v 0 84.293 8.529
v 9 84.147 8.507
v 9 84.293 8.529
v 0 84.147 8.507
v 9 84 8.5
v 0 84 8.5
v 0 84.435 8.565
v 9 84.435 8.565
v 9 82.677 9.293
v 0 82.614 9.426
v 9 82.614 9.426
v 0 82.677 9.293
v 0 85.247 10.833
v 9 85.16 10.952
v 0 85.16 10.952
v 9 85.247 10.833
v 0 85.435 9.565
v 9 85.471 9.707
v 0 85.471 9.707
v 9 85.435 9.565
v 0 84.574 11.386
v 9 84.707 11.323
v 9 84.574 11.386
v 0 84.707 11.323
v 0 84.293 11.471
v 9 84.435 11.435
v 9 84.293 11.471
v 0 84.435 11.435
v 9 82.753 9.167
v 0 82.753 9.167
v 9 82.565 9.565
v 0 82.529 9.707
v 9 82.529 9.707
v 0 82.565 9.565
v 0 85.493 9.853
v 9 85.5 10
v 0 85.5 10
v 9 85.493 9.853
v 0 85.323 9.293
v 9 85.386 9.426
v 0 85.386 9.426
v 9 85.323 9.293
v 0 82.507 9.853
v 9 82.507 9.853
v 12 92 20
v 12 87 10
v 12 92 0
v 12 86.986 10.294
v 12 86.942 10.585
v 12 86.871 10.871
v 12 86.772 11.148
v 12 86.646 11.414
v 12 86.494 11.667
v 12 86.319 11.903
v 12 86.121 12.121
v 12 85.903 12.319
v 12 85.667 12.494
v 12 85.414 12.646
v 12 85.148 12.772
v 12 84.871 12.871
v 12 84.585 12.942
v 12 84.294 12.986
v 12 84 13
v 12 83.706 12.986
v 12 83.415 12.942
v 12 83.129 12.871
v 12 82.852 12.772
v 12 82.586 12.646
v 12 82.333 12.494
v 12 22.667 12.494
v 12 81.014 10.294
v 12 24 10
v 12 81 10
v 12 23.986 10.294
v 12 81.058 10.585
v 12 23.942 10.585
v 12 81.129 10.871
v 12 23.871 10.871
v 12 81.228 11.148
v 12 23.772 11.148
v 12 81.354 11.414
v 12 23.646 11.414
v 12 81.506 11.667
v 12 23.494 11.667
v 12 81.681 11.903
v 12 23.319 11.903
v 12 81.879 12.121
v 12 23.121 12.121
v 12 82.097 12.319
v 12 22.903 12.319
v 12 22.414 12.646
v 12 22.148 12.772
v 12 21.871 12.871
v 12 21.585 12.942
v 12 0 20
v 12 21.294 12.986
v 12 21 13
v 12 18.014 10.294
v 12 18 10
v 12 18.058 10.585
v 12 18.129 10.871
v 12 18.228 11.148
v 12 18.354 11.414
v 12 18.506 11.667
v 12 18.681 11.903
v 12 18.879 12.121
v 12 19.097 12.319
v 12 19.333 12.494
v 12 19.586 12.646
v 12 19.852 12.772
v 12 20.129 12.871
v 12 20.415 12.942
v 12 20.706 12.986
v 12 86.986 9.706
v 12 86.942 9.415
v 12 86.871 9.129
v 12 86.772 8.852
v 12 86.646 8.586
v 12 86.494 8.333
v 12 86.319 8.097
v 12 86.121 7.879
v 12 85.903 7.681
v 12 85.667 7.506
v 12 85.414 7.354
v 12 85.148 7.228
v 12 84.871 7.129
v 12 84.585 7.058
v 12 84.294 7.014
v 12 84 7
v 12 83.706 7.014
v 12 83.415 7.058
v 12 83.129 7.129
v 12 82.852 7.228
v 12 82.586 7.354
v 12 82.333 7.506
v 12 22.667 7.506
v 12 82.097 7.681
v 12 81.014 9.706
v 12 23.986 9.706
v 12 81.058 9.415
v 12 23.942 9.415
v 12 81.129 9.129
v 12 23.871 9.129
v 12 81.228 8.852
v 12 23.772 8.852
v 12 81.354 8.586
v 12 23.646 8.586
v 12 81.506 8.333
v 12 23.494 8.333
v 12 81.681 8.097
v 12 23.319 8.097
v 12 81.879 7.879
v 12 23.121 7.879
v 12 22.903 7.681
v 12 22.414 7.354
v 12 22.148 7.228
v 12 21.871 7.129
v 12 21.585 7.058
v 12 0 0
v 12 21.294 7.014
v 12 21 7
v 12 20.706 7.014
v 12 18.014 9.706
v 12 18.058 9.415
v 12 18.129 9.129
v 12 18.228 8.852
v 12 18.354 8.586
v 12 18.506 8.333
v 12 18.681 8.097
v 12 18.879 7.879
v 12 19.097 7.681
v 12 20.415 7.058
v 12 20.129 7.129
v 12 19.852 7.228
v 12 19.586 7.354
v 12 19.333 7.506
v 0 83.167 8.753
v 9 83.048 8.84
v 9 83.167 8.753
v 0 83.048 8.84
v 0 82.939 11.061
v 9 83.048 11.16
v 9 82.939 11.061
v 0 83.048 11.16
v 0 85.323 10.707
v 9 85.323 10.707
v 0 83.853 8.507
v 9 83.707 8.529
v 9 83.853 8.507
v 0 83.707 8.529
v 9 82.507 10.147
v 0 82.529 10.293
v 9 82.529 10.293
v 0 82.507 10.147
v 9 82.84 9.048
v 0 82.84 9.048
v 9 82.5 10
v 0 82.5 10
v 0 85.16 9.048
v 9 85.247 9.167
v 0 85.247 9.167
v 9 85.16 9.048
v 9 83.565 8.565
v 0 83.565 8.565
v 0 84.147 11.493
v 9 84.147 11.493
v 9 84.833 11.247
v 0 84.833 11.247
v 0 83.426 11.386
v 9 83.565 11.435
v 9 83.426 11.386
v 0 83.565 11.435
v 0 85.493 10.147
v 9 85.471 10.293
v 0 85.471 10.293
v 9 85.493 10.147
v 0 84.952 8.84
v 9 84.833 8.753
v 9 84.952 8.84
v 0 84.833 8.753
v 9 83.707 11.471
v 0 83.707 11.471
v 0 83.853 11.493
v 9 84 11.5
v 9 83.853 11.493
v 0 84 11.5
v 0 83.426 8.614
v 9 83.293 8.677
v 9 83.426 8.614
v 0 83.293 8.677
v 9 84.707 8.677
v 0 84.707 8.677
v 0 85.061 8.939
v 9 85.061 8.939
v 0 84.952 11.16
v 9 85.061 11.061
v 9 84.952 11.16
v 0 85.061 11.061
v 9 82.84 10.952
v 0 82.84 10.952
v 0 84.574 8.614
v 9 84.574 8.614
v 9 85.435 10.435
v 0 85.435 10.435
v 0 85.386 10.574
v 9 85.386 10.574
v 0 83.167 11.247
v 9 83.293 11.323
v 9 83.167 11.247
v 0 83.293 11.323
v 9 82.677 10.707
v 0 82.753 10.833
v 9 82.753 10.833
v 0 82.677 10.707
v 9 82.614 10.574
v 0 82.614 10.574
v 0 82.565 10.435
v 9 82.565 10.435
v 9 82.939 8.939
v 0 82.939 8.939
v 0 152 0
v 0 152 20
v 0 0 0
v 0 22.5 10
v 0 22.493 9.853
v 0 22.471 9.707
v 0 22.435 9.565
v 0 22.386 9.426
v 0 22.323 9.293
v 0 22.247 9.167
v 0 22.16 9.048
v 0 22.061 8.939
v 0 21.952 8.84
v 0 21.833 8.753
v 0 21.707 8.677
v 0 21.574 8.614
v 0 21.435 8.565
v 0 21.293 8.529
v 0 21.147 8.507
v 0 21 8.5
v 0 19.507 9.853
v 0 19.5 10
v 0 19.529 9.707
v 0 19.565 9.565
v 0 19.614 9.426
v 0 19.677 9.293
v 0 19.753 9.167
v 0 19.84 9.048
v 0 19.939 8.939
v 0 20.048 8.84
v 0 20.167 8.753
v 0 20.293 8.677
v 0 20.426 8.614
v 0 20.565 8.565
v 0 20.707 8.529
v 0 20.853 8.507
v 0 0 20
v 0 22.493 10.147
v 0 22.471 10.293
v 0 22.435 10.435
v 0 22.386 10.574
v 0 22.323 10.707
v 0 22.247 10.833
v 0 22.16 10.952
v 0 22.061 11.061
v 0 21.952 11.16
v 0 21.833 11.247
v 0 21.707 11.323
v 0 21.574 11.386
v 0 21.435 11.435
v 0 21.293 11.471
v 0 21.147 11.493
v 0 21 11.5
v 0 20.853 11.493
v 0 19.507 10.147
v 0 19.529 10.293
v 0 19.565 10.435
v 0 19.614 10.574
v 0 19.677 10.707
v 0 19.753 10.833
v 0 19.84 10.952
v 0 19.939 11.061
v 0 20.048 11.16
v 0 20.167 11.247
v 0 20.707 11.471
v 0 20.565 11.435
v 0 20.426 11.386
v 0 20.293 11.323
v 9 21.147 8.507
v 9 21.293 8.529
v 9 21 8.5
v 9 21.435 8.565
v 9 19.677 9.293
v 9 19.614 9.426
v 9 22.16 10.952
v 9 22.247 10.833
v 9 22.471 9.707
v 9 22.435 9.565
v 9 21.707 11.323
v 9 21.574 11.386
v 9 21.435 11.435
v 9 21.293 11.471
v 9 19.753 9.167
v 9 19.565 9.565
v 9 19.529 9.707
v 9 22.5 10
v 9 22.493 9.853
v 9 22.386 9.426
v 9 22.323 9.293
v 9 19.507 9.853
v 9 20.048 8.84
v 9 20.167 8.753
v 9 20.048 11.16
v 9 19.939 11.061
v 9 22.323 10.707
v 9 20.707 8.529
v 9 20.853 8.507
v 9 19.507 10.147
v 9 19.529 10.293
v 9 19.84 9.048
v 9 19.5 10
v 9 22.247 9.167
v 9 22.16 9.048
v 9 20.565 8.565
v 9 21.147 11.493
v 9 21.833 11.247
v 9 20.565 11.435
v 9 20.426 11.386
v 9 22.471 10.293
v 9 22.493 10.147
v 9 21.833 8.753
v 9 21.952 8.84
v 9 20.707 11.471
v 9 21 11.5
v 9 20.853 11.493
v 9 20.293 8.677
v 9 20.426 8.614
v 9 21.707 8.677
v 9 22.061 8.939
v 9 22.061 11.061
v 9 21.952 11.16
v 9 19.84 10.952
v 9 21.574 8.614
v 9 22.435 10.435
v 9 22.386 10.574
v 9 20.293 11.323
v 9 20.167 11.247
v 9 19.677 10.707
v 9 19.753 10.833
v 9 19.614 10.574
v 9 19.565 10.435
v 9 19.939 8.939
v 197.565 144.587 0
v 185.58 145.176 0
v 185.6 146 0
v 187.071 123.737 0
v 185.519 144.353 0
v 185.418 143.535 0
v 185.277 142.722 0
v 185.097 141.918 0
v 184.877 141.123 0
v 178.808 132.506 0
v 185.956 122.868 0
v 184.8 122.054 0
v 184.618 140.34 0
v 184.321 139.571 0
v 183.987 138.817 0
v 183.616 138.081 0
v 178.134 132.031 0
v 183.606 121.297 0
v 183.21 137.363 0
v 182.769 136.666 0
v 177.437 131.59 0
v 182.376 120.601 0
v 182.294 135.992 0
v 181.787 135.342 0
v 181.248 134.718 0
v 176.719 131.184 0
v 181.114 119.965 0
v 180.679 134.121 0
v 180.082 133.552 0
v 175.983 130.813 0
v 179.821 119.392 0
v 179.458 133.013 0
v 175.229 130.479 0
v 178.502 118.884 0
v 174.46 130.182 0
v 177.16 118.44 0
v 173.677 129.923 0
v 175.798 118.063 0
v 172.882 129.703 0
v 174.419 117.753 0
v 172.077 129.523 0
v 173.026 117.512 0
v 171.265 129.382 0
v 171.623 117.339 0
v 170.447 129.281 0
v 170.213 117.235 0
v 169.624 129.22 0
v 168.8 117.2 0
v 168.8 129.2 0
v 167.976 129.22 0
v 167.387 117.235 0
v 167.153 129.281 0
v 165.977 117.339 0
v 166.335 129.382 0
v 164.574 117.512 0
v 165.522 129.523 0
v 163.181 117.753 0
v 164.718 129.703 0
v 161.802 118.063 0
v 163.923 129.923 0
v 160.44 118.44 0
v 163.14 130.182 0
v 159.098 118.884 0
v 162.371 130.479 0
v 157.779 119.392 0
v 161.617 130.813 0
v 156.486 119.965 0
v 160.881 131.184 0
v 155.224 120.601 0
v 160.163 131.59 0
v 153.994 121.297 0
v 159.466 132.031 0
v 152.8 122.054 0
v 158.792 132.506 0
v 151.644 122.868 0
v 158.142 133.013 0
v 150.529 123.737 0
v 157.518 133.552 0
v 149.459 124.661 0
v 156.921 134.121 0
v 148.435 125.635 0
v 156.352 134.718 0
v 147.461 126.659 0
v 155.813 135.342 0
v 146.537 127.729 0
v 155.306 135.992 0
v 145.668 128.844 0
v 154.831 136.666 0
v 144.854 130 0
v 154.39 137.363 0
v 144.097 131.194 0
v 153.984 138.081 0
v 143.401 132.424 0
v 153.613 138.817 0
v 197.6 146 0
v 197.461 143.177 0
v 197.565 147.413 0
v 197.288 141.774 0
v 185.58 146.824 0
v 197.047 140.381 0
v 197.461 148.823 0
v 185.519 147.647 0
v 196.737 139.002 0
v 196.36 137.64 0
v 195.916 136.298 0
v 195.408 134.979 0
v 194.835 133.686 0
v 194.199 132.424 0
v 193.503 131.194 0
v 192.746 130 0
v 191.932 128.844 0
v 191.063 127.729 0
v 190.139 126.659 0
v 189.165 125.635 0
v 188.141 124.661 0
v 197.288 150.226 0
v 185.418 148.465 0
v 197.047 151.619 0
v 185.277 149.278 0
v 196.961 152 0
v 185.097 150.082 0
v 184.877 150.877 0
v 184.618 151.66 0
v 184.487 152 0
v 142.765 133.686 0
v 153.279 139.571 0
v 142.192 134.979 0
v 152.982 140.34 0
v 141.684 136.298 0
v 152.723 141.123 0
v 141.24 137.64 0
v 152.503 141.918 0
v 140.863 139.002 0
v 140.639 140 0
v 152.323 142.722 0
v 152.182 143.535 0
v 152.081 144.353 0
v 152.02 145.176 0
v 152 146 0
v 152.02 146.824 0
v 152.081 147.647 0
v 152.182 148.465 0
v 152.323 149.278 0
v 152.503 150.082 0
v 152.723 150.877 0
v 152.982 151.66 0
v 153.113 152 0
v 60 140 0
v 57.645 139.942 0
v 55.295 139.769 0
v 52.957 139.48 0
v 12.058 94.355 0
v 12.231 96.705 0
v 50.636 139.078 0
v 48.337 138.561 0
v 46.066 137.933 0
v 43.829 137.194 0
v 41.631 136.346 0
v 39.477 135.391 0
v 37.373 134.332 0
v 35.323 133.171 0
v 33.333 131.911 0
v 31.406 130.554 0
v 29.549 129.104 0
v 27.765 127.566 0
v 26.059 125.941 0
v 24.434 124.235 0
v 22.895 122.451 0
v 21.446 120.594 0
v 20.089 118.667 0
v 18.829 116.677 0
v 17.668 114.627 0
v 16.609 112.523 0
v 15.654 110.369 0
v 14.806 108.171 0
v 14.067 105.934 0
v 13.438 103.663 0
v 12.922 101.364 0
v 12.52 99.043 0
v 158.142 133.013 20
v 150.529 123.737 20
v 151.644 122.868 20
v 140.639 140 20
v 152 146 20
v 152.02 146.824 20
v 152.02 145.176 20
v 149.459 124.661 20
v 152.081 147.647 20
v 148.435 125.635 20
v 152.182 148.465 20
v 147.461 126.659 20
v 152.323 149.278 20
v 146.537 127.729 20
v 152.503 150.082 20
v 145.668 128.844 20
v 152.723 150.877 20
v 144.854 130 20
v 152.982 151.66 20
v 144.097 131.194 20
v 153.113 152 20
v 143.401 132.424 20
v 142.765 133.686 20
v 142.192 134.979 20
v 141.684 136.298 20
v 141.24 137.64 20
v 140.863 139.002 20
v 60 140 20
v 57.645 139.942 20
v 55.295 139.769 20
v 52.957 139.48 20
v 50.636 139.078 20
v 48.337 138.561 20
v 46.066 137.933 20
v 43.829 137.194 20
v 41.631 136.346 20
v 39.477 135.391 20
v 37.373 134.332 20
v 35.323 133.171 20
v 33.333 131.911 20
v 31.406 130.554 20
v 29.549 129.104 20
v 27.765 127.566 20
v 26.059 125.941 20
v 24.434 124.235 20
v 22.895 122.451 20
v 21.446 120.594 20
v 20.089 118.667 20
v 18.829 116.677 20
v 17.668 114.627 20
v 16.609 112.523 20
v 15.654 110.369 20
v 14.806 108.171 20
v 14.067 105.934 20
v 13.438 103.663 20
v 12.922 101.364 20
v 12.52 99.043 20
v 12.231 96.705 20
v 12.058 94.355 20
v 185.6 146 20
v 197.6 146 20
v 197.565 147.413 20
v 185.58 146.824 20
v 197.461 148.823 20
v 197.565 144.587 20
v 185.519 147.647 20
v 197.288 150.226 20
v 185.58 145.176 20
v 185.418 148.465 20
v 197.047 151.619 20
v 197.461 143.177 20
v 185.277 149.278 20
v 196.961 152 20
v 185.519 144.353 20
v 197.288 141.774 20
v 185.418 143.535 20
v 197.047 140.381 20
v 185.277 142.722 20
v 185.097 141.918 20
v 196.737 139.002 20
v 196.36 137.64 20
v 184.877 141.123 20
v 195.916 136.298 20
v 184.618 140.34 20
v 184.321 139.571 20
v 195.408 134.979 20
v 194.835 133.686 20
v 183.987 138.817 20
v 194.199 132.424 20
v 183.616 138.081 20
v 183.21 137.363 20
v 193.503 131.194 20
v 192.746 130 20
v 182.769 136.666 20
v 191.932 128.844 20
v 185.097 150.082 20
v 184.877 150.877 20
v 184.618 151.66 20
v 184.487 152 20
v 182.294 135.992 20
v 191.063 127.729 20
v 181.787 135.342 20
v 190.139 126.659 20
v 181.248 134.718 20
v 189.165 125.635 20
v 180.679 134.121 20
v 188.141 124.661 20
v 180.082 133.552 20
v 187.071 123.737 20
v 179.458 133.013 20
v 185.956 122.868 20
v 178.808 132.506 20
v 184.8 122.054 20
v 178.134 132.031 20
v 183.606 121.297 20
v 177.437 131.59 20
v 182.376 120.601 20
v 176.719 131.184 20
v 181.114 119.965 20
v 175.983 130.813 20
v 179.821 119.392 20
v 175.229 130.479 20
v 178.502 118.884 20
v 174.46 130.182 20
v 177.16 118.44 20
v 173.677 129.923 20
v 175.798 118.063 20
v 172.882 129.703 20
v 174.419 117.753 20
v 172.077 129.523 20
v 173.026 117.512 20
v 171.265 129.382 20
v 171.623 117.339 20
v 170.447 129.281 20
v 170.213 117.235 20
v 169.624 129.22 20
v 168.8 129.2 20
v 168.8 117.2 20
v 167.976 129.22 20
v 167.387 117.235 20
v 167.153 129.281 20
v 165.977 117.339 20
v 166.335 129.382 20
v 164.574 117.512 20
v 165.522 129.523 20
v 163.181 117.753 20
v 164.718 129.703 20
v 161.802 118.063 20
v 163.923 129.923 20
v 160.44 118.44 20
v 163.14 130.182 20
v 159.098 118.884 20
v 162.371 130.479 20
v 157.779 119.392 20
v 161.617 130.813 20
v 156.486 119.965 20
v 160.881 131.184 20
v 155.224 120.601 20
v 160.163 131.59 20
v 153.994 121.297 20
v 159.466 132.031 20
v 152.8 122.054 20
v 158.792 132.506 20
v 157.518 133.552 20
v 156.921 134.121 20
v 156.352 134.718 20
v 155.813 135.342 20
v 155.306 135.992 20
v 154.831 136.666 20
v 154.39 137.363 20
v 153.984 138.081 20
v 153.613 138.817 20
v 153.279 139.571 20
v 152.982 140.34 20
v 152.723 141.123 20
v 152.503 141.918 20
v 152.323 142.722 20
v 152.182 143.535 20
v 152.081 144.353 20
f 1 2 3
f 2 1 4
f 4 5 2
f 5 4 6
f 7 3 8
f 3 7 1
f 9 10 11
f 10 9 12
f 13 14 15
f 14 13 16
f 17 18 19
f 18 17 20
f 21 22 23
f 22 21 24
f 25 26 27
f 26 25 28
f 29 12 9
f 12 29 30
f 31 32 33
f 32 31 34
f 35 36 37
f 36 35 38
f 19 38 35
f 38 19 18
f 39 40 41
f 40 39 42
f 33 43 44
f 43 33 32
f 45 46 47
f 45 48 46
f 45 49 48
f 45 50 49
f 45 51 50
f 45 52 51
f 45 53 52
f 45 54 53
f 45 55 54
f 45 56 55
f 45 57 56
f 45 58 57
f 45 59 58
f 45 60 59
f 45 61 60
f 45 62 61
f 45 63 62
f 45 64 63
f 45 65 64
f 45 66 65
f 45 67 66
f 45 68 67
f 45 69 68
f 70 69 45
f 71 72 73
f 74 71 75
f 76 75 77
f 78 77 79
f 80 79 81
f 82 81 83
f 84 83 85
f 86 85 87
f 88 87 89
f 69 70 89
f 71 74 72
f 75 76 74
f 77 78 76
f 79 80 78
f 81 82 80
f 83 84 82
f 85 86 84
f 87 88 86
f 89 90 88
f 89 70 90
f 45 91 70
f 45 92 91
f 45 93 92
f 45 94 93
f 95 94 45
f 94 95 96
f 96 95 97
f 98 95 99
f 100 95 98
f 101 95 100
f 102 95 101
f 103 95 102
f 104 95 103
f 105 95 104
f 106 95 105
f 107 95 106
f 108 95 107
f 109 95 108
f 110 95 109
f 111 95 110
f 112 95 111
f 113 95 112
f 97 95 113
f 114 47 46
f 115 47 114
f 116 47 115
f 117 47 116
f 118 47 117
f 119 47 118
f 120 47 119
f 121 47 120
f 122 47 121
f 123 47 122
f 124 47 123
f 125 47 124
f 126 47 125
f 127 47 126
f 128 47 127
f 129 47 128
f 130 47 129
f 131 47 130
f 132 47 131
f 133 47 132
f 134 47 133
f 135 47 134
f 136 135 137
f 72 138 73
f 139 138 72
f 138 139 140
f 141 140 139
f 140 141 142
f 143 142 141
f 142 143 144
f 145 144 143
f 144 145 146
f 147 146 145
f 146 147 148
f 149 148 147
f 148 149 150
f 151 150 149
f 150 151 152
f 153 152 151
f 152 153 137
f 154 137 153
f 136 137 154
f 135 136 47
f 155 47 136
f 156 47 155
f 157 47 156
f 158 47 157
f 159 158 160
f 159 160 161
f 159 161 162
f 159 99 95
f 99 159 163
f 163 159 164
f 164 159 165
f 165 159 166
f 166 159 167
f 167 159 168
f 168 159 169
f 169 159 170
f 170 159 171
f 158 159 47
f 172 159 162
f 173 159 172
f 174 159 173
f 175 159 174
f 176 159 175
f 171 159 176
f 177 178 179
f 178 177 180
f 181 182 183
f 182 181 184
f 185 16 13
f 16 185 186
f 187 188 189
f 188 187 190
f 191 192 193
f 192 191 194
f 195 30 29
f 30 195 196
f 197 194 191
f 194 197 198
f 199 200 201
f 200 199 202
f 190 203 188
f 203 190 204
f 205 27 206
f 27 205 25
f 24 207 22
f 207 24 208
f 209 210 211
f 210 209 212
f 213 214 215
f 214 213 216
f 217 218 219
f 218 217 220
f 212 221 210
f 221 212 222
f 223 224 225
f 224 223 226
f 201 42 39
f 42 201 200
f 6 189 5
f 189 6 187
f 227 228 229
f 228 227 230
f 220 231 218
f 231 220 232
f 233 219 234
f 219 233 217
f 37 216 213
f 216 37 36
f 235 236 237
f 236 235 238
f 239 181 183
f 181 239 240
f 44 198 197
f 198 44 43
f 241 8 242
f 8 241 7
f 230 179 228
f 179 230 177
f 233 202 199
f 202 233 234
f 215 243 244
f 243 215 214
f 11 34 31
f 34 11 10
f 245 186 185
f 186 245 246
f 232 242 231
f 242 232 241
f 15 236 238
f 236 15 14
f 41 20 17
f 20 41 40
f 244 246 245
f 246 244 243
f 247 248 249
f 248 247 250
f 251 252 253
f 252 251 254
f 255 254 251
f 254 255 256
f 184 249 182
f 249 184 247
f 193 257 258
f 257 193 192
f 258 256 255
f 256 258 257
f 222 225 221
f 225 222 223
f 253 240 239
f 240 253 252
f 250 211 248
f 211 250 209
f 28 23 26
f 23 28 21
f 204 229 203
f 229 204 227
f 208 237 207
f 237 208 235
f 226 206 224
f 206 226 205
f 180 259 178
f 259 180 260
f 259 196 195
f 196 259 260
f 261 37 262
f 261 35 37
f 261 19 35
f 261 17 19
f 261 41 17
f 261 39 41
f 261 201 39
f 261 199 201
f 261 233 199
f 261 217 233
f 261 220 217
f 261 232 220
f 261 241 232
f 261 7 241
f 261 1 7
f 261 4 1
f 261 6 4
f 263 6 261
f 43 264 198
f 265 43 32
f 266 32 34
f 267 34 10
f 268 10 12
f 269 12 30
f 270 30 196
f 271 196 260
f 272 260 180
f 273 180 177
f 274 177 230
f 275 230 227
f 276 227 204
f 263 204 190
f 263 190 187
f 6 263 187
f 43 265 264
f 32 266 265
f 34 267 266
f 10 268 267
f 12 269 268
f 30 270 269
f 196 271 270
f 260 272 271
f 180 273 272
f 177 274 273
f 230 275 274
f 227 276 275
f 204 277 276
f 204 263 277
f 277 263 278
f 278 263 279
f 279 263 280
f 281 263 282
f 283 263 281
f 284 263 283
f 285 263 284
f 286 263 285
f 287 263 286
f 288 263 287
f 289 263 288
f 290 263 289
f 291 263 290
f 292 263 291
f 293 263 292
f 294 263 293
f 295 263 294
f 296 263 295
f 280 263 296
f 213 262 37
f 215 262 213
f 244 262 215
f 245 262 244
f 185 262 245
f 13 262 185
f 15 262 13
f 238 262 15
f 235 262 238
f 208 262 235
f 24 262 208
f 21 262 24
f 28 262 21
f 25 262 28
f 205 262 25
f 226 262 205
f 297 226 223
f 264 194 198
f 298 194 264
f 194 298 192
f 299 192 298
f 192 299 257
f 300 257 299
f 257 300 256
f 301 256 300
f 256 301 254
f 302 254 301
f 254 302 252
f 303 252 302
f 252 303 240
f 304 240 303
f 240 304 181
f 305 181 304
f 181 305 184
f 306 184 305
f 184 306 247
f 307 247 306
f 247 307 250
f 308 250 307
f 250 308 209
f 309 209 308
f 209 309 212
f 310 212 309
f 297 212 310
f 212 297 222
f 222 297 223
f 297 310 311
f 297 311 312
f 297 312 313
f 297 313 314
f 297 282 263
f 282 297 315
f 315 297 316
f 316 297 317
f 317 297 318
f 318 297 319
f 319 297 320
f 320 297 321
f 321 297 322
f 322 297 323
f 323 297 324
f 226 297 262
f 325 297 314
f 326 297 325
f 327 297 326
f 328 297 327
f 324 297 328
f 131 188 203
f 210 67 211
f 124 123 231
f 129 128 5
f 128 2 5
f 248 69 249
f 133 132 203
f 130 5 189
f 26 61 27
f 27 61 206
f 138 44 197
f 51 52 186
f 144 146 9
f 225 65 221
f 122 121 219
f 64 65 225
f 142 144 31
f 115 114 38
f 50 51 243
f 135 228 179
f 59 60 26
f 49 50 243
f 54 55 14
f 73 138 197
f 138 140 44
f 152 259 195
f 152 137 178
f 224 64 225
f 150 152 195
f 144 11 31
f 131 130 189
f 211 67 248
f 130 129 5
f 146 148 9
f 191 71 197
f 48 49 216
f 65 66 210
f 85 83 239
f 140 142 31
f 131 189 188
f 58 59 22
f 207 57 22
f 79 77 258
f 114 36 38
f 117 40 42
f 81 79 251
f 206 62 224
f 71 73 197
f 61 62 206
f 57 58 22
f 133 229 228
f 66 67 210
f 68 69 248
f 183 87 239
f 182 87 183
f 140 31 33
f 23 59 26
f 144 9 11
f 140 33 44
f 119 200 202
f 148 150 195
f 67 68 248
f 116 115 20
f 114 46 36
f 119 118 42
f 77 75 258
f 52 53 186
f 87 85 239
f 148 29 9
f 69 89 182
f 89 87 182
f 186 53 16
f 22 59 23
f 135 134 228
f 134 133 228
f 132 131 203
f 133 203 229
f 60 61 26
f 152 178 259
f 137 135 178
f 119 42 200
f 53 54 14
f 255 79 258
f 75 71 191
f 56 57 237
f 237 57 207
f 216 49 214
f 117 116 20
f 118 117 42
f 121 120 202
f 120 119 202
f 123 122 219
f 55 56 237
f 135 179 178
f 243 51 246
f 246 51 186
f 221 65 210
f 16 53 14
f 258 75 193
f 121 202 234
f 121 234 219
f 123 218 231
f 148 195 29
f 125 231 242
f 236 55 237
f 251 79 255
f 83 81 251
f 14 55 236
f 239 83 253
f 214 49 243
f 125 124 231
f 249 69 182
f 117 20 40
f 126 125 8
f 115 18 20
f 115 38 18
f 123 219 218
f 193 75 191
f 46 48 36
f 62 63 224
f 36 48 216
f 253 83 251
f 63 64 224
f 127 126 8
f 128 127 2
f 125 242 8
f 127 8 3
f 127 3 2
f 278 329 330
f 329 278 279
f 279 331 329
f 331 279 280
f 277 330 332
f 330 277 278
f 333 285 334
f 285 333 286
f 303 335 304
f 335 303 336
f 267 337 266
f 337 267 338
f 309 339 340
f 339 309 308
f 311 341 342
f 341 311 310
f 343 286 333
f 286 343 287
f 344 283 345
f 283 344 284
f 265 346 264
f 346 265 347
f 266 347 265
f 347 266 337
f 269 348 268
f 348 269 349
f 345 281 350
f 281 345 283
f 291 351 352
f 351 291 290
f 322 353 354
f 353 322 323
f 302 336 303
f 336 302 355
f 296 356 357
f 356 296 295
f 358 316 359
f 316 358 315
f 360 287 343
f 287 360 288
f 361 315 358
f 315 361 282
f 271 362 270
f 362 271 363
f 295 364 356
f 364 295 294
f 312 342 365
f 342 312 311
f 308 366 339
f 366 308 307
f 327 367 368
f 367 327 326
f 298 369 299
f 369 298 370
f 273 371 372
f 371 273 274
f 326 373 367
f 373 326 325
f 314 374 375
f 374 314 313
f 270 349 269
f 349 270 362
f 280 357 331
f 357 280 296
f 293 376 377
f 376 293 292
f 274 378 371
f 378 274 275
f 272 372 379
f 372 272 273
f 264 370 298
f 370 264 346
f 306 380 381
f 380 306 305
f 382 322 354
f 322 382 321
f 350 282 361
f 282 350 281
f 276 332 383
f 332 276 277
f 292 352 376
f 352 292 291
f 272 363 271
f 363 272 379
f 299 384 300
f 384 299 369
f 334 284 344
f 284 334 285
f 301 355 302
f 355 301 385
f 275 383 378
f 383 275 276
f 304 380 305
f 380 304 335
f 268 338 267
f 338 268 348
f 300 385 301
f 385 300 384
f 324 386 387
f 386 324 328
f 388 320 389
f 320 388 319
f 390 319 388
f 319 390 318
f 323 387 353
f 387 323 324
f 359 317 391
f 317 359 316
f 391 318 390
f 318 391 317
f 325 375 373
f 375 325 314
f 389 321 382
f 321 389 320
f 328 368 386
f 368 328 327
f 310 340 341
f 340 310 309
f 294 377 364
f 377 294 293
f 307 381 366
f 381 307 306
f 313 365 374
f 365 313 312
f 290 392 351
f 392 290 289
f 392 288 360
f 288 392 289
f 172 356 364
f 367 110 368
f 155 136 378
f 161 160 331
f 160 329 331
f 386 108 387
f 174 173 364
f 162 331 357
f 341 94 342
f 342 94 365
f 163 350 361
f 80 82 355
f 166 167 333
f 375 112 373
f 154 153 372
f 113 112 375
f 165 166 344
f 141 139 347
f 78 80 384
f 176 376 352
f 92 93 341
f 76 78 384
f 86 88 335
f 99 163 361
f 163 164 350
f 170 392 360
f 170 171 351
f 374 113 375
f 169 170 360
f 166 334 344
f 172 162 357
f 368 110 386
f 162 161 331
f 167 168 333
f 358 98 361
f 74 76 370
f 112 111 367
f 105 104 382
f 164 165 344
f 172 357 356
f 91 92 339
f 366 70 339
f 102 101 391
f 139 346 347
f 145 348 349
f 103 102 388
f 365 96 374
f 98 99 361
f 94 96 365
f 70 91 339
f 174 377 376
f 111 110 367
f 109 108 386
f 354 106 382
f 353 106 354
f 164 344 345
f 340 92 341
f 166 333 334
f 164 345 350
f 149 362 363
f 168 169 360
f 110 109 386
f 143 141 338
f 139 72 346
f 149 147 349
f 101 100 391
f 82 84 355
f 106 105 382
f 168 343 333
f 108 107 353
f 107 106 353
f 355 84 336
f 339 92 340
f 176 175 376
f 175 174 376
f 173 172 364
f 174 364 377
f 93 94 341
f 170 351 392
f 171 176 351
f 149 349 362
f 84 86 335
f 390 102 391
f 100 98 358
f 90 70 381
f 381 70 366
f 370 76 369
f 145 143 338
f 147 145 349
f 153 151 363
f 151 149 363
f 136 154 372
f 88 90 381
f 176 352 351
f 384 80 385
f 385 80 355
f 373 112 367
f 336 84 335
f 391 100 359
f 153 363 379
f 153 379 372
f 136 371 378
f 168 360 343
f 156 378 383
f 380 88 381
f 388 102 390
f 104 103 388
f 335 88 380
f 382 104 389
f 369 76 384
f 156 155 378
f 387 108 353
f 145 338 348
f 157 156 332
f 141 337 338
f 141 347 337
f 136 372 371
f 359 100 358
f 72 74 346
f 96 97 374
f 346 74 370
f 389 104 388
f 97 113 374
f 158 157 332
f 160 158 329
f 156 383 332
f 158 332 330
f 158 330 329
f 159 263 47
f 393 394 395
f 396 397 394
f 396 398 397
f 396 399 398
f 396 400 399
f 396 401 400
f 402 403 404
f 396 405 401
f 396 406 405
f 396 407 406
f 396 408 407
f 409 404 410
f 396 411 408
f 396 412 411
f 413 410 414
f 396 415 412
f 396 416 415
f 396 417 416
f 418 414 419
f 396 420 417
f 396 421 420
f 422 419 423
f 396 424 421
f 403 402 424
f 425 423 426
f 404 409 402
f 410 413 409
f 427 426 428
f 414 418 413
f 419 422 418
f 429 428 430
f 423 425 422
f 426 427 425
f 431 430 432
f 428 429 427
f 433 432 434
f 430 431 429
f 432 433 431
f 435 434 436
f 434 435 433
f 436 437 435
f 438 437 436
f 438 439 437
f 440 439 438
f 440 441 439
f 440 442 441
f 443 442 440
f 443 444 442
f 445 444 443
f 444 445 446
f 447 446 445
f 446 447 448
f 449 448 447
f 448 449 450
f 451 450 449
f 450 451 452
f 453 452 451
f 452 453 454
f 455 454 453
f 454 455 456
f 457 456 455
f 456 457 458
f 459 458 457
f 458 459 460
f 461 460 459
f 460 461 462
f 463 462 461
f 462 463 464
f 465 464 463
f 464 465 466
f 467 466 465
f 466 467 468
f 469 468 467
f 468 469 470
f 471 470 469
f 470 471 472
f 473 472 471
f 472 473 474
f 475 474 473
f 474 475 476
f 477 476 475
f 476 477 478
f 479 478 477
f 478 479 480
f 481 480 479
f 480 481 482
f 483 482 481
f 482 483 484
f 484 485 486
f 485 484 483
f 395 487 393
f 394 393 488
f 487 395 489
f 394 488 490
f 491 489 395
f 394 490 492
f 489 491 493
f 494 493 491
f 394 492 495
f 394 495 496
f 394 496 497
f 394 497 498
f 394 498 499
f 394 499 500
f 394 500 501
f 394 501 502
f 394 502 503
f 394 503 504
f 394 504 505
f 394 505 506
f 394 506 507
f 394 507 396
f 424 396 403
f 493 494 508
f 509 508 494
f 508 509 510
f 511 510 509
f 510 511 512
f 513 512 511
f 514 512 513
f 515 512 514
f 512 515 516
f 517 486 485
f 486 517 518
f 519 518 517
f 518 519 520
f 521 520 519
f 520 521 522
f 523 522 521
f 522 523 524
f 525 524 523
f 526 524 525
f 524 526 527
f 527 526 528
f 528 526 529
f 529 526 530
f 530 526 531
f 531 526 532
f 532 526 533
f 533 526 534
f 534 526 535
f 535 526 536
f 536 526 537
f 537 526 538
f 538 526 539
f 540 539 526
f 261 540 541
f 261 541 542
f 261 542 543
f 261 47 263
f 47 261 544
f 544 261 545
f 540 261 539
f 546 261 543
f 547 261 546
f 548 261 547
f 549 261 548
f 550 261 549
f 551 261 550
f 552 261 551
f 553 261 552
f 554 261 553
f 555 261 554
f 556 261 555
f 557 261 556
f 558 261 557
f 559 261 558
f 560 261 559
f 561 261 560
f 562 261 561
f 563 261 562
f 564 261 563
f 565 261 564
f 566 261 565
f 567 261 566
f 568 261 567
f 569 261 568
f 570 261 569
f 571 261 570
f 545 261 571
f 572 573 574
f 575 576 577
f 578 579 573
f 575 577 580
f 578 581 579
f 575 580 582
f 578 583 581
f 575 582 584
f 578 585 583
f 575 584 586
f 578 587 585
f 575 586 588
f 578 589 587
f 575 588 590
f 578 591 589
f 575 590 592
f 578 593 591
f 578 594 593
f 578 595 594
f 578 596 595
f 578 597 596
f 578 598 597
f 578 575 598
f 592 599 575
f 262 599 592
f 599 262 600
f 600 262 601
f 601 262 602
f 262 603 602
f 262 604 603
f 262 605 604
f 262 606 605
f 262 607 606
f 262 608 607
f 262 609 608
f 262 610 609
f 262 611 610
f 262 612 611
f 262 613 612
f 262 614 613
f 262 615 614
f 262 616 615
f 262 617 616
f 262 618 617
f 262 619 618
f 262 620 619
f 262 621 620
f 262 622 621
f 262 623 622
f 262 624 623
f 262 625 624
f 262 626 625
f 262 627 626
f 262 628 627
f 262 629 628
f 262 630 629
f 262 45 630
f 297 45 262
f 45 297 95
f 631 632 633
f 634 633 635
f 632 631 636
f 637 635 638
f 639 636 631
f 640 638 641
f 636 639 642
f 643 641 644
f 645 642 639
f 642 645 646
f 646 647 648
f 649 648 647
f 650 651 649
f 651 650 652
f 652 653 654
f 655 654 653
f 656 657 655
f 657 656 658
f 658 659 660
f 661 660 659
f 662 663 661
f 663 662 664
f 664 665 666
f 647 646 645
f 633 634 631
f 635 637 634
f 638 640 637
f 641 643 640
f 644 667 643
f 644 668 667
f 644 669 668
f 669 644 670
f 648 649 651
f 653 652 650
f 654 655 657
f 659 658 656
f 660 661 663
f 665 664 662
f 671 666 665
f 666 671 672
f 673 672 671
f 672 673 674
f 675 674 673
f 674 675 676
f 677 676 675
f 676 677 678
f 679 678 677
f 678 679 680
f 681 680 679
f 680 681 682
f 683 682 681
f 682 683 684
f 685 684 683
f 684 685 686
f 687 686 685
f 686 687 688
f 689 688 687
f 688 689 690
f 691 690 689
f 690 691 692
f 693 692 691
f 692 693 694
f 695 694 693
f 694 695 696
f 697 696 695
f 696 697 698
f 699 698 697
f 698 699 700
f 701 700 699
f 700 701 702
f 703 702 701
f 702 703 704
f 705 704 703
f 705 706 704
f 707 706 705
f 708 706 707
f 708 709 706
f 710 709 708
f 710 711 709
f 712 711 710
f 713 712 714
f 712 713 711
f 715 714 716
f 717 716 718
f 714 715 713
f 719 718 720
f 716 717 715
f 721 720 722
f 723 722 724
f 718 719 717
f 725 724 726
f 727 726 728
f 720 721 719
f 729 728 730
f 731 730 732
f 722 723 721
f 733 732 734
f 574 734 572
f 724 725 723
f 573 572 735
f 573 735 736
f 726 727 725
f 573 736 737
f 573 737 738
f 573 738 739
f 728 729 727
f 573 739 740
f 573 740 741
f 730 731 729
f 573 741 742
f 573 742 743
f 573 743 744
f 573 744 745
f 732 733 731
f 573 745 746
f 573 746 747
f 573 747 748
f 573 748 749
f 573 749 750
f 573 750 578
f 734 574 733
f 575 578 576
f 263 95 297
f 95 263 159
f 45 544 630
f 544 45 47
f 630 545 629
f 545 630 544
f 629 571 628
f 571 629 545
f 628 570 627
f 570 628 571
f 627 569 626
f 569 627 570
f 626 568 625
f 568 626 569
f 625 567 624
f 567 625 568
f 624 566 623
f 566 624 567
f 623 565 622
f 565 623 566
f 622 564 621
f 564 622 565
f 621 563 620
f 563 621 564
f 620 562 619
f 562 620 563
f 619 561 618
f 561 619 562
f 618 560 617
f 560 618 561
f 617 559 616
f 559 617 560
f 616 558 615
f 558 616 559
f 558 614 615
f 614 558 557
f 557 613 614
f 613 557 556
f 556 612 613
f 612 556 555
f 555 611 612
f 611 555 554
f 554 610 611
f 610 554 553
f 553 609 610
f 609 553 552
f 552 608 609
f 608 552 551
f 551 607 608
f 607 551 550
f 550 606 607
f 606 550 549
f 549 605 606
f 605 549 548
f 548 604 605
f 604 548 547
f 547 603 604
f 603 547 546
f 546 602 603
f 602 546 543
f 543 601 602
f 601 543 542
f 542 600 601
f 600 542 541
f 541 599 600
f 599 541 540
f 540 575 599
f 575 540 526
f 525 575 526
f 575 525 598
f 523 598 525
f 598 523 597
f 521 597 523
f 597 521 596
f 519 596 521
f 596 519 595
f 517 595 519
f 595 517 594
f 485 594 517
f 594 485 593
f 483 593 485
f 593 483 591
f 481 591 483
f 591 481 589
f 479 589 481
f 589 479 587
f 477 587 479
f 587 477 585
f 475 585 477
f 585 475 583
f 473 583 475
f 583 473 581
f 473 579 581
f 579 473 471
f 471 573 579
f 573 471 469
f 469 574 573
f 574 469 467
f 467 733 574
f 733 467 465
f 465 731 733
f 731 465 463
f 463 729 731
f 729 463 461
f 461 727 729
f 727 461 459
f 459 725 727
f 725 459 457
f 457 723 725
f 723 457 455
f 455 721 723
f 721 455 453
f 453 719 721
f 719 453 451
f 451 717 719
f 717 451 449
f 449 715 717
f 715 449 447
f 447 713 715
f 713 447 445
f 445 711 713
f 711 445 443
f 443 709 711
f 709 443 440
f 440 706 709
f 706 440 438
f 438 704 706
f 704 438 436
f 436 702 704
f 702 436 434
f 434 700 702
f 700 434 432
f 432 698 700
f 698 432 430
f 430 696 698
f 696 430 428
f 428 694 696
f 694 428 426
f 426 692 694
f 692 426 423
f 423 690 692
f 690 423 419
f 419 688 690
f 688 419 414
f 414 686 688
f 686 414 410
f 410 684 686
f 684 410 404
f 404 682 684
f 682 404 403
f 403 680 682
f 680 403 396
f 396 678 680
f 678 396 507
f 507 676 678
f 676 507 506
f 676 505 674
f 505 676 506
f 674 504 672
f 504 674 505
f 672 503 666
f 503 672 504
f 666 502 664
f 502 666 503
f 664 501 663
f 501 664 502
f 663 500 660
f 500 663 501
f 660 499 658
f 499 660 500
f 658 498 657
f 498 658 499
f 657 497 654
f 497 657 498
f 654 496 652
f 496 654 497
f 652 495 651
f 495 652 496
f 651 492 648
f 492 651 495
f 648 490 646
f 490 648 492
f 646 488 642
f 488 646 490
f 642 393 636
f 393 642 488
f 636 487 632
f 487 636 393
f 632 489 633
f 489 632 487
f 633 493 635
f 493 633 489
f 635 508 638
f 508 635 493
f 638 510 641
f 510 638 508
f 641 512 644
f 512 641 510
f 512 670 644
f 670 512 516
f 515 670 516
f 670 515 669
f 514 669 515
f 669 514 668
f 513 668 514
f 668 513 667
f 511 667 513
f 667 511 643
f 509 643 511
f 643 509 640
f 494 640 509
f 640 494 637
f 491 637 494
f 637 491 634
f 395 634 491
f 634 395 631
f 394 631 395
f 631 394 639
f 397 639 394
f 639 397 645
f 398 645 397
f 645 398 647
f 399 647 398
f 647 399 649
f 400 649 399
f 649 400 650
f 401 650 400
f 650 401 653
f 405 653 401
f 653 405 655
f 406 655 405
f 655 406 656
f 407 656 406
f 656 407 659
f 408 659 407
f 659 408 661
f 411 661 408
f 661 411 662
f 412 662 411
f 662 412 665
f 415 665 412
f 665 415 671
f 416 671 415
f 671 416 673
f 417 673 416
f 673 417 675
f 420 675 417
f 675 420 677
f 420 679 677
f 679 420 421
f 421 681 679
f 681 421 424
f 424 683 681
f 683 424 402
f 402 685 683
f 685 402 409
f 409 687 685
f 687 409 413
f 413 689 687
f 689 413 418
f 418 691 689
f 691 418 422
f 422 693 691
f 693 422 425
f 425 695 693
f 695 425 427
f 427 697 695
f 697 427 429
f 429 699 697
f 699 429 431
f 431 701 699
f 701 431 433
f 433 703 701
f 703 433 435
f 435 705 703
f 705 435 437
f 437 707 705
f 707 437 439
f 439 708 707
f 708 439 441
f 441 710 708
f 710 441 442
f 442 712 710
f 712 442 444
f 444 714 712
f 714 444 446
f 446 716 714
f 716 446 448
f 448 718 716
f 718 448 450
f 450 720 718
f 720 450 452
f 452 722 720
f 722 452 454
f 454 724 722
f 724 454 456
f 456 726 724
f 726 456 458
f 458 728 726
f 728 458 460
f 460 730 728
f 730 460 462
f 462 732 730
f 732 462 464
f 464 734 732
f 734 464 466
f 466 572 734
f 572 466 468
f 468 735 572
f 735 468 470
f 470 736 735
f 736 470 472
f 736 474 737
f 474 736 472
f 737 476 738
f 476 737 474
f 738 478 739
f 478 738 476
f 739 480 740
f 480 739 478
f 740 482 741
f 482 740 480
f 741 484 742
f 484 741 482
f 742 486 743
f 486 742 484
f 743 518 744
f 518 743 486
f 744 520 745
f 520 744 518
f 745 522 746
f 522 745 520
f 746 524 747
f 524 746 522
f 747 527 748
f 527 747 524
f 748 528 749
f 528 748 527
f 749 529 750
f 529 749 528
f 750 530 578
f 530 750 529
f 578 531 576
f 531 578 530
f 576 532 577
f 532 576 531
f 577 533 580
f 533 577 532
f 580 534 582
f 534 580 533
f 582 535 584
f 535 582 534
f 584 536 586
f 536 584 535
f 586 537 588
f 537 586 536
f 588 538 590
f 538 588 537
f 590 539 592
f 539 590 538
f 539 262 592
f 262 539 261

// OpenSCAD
bredde=12;
lengde=140;
dybde=20;

hylleknekt_p = [
    [0, 0],
    [0, lengde+bredde],
    [lengde+bredde, lengde+bredde],
    [lengde+bredde, lengde],
    [bredde*5, lengde],
    [bredde, lengde-bredde*4],
    [bredde, 0],
];

module skruehull(lengde, dia) {
    rotate([0, 90, 0]) {
        cylinder(h=lengde, d=dia);
        translate([0, 0, lengde-dia]) {
            cylinder(h=dia, d1=dia, d2=dia*2);
        }
    }
}

difference() {
    linear_extrude(dybde) {

        difference() {
            polygon(hylleknekt_p);
            translate([bredde*5,lengde-bredde*4])
                circle(r=bredde*4, $fn=128);
        }
        translate([lengde+bredde*2.4,lengde+bredde/2]) {
            difference() {
                circle(d=bredde*4.8, $fn=128);
                circle(d=bredde*2.8, $fn=128);
                translate([-bredde*2.4,bredde/2,0]) {
                    square([bredde*4.8,bredde*2]);
                }
            }
        }
    }
    translate([0, lengde*.6, dybde/2]) {
        skruehull(bredde, 3, $fn=64);
    }
    translate([0, lengde*.15, dybde/2]) {
        skruehull(bredde, 3, $fn=64);
    }
}
